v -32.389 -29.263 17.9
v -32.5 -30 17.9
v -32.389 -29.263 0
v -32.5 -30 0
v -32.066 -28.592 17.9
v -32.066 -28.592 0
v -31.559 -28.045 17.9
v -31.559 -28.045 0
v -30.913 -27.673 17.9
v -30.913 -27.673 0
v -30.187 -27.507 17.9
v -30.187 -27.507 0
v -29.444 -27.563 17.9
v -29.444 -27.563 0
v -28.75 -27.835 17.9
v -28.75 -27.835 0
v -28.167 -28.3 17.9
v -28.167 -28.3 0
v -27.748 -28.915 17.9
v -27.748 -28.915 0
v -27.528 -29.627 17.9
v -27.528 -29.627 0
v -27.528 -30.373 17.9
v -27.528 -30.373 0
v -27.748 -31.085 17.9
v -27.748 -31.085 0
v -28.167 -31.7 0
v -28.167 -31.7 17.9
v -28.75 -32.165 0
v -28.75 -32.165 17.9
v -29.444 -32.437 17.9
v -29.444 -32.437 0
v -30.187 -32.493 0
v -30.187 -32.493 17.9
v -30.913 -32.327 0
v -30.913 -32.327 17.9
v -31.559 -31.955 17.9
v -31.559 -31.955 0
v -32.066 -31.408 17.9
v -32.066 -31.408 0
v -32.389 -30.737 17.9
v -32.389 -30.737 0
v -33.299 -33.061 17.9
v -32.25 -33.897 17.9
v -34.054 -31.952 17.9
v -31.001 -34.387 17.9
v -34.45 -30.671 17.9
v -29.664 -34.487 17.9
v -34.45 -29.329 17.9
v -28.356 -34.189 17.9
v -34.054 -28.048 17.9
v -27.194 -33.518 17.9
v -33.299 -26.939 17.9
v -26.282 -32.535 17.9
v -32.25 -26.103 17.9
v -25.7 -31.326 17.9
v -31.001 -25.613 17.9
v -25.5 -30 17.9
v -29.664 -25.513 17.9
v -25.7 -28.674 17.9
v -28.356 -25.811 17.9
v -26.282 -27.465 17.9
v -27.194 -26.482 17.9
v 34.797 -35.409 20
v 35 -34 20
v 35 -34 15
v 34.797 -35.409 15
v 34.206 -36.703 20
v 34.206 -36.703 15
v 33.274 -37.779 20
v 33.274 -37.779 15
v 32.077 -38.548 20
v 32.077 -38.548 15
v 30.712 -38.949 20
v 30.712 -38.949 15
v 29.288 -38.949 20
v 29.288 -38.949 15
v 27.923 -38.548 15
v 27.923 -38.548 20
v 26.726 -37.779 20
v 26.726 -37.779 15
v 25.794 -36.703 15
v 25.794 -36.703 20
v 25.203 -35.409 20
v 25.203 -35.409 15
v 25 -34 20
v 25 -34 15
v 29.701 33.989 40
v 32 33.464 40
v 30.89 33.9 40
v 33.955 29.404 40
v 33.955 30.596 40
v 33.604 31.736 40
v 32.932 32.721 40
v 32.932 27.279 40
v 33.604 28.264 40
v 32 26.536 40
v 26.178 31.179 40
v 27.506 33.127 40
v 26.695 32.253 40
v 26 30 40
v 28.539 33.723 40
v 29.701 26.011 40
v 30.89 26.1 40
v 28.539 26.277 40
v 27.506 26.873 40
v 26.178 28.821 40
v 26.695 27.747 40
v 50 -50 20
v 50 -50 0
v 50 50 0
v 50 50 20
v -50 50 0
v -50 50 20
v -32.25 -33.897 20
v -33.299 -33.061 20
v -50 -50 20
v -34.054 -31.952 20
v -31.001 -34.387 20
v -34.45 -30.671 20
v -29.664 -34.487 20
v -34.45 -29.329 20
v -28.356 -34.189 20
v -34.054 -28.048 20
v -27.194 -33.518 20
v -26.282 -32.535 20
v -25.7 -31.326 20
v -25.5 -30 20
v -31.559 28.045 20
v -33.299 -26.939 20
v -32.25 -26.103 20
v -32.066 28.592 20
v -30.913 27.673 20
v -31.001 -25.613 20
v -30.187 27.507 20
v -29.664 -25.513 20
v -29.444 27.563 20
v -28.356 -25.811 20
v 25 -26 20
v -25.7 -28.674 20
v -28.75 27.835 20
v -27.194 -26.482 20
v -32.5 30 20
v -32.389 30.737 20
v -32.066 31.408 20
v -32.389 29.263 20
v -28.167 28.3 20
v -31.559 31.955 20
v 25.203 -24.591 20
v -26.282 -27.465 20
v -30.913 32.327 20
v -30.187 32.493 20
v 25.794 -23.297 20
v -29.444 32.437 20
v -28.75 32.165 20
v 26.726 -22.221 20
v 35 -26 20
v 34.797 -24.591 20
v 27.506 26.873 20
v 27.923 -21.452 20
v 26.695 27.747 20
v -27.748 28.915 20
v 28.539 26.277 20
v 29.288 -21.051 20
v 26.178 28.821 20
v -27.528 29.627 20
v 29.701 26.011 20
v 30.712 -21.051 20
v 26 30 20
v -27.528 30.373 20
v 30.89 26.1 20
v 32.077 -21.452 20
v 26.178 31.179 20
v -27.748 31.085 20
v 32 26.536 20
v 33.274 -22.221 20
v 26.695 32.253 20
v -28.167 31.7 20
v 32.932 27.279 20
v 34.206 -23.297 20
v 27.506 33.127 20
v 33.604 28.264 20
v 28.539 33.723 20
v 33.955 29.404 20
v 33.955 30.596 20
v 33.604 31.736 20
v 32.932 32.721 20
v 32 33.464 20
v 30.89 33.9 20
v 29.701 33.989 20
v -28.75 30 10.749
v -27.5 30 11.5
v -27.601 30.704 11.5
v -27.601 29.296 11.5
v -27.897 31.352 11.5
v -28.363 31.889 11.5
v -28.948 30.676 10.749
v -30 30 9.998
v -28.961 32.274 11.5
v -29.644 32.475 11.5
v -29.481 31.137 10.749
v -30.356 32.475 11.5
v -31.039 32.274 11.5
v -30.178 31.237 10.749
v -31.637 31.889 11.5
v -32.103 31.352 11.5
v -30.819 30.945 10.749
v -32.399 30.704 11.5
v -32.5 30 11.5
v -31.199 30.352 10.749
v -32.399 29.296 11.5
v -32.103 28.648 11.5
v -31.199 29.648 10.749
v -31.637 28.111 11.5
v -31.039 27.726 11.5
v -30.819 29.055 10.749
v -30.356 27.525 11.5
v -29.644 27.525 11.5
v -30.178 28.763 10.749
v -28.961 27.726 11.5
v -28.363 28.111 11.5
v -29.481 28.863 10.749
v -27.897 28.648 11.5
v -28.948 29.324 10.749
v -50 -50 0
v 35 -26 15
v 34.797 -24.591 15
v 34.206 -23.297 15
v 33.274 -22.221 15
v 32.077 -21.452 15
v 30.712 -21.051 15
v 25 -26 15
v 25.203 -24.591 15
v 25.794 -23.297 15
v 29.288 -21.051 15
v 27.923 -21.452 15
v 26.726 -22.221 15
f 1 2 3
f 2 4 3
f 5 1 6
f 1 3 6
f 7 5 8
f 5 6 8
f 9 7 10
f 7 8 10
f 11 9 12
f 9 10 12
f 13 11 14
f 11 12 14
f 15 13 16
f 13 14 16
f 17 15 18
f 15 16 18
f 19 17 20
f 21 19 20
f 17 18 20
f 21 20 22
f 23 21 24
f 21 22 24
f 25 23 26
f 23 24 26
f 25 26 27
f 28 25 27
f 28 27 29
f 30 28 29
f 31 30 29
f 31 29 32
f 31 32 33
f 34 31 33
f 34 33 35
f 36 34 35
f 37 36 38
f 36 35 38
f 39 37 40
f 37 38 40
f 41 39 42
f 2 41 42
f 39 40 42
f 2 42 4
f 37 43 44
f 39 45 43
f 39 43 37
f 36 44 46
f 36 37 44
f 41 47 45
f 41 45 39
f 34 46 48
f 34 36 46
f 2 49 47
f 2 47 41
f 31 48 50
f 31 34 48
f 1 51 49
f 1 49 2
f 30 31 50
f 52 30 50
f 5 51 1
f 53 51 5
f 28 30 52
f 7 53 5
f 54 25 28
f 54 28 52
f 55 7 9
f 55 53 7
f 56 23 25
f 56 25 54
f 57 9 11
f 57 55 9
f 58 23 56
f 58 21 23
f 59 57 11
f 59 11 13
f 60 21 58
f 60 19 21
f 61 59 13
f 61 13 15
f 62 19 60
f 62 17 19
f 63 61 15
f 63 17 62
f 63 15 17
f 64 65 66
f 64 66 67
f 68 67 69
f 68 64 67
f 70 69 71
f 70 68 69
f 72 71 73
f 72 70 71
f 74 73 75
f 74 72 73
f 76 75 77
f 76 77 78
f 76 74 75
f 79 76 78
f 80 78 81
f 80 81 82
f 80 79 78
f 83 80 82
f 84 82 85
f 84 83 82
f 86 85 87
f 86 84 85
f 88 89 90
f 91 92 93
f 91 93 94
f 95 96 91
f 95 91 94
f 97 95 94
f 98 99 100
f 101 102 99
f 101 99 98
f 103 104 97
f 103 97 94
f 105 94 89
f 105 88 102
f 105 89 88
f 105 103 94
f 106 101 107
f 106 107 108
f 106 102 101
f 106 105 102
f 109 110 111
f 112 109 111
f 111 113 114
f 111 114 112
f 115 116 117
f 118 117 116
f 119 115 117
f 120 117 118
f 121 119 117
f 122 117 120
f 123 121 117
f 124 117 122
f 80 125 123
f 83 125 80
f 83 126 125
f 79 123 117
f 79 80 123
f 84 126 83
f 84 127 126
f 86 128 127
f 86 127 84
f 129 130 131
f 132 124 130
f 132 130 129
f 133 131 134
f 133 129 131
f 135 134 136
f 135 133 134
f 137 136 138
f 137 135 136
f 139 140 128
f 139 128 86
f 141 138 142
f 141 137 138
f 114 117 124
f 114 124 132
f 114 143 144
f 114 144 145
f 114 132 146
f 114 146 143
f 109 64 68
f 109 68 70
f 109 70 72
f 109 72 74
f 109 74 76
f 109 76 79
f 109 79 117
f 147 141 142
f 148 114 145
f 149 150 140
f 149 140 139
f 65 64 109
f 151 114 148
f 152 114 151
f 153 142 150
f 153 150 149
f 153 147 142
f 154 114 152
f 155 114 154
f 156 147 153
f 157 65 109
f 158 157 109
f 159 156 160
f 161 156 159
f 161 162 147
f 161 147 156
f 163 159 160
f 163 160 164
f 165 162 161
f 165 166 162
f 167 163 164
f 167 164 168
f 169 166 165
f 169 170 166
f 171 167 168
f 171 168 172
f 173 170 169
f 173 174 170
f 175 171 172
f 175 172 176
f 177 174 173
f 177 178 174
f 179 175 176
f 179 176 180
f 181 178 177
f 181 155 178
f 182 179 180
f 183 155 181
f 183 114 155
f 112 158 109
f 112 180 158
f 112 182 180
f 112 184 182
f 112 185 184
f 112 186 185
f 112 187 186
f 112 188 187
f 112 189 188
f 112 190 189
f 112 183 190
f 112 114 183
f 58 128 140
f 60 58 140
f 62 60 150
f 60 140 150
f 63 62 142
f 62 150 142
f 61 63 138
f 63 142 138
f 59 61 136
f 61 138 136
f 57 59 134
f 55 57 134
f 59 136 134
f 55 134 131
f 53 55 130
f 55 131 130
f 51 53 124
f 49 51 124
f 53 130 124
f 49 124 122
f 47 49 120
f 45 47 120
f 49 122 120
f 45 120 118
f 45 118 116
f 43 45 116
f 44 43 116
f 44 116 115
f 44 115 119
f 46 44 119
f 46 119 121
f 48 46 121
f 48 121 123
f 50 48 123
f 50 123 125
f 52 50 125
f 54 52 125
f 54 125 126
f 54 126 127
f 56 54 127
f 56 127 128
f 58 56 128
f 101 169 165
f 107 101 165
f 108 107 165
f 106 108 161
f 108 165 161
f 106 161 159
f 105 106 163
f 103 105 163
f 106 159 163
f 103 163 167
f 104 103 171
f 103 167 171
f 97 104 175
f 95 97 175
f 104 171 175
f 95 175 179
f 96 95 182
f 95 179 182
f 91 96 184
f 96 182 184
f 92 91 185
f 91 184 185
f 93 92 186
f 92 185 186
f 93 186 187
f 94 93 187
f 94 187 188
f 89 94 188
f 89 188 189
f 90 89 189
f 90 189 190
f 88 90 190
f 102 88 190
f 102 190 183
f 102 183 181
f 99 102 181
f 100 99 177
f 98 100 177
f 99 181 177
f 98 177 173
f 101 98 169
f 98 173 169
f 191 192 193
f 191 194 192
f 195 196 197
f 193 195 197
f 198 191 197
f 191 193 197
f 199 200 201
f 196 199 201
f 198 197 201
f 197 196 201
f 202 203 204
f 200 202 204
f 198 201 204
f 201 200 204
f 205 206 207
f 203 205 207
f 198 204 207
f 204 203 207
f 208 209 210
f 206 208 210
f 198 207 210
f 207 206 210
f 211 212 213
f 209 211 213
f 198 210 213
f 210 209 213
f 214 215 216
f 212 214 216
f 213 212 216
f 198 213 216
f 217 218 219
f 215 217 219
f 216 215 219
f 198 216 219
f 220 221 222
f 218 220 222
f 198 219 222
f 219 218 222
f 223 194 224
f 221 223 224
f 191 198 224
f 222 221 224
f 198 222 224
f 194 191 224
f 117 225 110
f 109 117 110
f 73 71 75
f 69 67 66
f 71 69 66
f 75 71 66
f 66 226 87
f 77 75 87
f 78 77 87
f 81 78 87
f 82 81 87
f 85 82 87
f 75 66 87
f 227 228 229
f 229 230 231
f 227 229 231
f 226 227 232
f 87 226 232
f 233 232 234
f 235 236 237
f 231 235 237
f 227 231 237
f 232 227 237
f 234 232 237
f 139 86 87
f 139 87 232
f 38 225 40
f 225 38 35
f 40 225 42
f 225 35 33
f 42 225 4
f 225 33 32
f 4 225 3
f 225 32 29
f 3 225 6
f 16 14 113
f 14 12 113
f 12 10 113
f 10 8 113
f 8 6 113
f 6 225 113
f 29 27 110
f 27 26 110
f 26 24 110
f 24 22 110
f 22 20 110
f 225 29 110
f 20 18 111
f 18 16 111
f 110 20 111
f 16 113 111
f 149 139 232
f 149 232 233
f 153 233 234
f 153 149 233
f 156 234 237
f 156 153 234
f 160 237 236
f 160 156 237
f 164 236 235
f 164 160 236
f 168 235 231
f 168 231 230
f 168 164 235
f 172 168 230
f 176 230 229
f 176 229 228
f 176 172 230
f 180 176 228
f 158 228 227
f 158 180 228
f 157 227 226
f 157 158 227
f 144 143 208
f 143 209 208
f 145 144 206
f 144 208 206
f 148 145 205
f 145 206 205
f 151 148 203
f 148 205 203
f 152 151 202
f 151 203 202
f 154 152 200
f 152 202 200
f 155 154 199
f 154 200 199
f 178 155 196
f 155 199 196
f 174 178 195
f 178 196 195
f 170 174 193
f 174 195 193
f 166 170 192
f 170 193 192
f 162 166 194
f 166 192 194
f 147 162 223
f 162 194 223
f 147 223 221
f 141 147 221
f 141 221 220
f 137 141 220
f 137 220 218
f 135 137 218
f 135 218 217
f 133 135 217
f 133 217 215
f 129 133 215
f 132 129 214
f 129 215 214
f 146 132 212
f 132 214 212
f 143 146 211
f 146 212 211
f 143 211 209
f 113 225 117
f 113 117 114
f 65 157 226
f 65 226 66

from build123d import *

# Parameters (mm, degrees)
SKIZZE1_W                       = 100
SKIZZE1_H                       = 100
AUFSATZ_LINEAR_AUSTRAGEN1_DEPTH = 20
F_5_0MM_STIFTLOCH1_D            = 5
F_5_0MM_STIFTLOCH1_DEPTH        = 8.5
F_5_0MM_STIFTLOCH1_TIP          = 1.502151548
SKIZZE5_R                       = 4
AUFSATZ_LINEAR_AUSTRAGEN2_DEPTH = 20
BOHRUNG1_D                      = 5
BOHRUNG1_DEPTH                  = 20
BOHRUNG1_CBORE_D                = 9
BOHRUNG1_CBORE_DEPTH            = 2.1
BOHRUNG1_TIP                    = 1.502151548
SCHNITT_LINEAR_AUSTRAGEN1_DEPTH = 5


with BuildPart() as part:
    # Skizze1 → Aufsatz-Linear austragen1 (new body)
    with BuildSketch(Plane.XY):
        Rectangle(SKIZZE1_W, SKIZZE1_H)
    extrude(amount=AUFSATZ_LINEAR_AUSTRAGEN1_DEPTH)

    # Ø5.0mm Stiftloch1
    with Locations(Plane.XY.offset(20)):
        with Locations((-30, 30)):
            Hole(F_5_0MM_STIFTLOCH1_D / 2, depth=F_5_0MM_STIFTLOCH1_DEPTH)
            with Locations((0, 0, -(F_5_0MM_STIFTLOCH1_DEPTH + F_5_0MM_STIFTLOCH1_TIP / 2))):  # 118° drill point
                Cone(0, F_5_0MM_STIFTLOCH1_D / 2, F_5_0MM_STIFTLOCH1_TIP, mode=Mode.SUBTRACT)

    # Skizze5 → Aufsatz-Linear austragen2 (add)
    with BuildSketch(Plane.XY.offset(20)):
        with Locations(Location((30, 30, 0), (0, 0, 180))):
            Circle(SKIZZE5_R)
    extrude(amount=AUFSATZ_LINEAR_AUSTRAGEN2_DEPTH)

    # Bohrung1
    with Locations(Plane.XY.offset(20)):
        with Locations((-30, -30)):
            CounterBoreHole(BOHRUNG1_D / 2, BOHRUNG1_CBORE_D / 2, BOHRUNG1_CBORE_DEPTH, depth=BOHRUNG1_DEPTH)
            with Locations((0, 0, -(BOHRUNG1_DEPTH + BOHRUNG1_TIP / 2))):  # 118° drill point
                Cone(0, BOHRUNG1_D / 2, BOHRUNG1_TIP, mode=Mode.SUBTRACT)

    # Skizze9 → Schnitt-Linear austragen1 (cut)
    with BuildSketch(Plane.XY.offset(20)):
        with BuildLine():
            Line((25, -34), (25, -26))
            ThreePointArc((25, -26), (30, -21), (35, -26))
            Line((35, -26), (35, -34))
            ThreePointArc((35, -34), (30, -39), (25, -34))
        make_face()
    extrude(amount=-SCHNITT_LINEAR_AUSTRAGEN1_DEPTH, mode=Mode.SUBTRACT)


solid = part.part
